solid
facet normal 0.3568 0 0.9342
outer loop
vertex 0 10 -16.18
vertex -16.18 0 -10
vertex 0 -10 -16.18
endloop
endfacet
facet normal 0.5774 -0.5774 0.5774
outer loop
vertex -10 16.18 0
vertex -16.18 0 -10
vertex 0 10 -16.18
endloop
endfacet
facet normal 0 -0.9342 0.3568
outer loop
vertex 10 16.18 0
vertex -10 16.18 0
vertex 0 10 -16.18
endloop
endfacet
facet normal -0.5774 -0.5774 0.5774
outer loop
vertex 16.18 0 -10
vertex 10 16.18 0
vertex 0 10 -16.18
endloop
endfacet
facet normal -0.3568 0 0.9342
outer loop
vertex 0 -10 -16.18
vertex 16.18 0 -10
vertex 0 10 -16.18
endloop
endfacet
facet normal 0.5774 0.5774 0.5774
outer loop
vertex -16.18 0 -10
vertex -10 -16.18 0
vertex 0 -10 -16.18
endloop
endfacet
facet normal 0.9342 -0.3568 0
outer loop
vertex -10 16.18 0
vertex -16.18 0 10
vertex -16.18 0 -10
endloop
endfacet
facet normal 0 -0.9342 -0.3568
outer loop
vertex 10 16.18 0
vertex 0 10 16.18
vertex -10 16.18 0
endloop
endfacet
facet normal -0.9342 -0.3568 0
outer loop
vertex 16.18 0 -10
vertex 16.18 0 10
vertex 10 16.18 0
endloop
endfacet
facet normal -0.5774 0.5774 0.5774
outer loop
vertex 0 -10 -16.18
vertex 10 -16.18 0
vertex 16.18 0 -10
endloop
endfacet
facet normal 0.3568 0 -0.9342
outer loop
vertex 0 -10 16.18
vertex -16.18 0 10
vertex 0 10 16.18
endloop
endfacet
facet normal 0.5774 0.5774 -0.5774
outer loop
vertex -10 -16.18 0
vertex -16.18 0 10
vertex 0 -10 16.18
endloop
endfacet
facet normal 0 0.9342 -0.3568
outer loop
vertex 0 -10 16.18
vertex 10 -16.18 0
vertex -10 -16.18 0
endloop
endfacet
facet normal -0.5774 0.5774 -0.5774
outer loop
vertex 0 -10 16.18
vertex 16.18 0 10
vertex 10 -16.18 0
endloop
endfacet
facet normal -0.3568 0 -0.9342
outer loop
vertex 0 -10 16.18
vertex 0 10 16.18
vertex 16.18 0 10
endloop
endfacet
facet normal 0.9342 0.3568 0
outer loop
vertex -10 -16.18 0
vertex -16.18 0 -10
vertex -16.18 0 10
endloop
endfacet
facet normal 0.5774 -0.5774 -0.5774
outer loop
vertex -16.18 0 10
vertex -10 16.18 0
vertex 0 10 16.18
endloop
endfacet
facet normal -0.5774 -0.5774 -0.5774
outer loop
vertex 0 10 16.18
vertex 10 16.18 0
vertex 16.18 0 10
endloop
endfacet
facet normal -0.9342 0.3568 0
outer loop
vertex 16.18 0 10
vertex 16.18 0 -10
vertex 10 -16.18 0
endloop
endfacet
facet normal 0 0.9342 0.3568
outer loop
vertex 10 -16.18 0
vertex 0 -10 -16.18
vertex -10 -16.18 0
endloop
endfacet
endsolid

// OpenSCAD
// Icosahedron Implementation
// Based on three mutually perpendicular rectangles

module icosahedron(size = 1) {
    phi = (1 + sqrt(5)) / 2; // The Golden Ratio
    
    // Scale the coordinates by the size parameter
    s = size;

    vertices = [
        [0, -s, -s*phi], [0,  s, -s*phi], [0,  s,  s*phi], [0, -s,  s*phi], // Rectangle 1
        [-s, -s*phi, 0], [ s, -s*phi, 0], [ s,  s*phi, 0], [-s,  s*phi, 0], // Rectangle 2
        [-s*phi, 0, -s], [ s*phi, 0, -s], [ s*phi, 0,  s], [-s*phi, 0,  s]  // Rectangle 3
    ];

    faces = [
        [0, 8, 1], [1, 8, 7], [1, 7, 6], [1, 6, 9], [1, 9, 0], // Top around vertex 1
        [0, 4, 8], [8, 11, 7], [7, 2, 6], [6, 10, 9], [9, 5, 0], // Upper mid
        [2, 11, 3], [3, 11, 4], [4, 5, 3], [5, 10, 3], [10, 2, 3], // Bottom around vertex 3
        [11, 8, 4], [2, 7, 11], [10, 6, 2], [5, 9, 10], [4, 0, 5]  // Lower mid
    ];

    polyhedron(points = vertices, faces = faces);
}

// Call the module
icosahedron(size = 10);
